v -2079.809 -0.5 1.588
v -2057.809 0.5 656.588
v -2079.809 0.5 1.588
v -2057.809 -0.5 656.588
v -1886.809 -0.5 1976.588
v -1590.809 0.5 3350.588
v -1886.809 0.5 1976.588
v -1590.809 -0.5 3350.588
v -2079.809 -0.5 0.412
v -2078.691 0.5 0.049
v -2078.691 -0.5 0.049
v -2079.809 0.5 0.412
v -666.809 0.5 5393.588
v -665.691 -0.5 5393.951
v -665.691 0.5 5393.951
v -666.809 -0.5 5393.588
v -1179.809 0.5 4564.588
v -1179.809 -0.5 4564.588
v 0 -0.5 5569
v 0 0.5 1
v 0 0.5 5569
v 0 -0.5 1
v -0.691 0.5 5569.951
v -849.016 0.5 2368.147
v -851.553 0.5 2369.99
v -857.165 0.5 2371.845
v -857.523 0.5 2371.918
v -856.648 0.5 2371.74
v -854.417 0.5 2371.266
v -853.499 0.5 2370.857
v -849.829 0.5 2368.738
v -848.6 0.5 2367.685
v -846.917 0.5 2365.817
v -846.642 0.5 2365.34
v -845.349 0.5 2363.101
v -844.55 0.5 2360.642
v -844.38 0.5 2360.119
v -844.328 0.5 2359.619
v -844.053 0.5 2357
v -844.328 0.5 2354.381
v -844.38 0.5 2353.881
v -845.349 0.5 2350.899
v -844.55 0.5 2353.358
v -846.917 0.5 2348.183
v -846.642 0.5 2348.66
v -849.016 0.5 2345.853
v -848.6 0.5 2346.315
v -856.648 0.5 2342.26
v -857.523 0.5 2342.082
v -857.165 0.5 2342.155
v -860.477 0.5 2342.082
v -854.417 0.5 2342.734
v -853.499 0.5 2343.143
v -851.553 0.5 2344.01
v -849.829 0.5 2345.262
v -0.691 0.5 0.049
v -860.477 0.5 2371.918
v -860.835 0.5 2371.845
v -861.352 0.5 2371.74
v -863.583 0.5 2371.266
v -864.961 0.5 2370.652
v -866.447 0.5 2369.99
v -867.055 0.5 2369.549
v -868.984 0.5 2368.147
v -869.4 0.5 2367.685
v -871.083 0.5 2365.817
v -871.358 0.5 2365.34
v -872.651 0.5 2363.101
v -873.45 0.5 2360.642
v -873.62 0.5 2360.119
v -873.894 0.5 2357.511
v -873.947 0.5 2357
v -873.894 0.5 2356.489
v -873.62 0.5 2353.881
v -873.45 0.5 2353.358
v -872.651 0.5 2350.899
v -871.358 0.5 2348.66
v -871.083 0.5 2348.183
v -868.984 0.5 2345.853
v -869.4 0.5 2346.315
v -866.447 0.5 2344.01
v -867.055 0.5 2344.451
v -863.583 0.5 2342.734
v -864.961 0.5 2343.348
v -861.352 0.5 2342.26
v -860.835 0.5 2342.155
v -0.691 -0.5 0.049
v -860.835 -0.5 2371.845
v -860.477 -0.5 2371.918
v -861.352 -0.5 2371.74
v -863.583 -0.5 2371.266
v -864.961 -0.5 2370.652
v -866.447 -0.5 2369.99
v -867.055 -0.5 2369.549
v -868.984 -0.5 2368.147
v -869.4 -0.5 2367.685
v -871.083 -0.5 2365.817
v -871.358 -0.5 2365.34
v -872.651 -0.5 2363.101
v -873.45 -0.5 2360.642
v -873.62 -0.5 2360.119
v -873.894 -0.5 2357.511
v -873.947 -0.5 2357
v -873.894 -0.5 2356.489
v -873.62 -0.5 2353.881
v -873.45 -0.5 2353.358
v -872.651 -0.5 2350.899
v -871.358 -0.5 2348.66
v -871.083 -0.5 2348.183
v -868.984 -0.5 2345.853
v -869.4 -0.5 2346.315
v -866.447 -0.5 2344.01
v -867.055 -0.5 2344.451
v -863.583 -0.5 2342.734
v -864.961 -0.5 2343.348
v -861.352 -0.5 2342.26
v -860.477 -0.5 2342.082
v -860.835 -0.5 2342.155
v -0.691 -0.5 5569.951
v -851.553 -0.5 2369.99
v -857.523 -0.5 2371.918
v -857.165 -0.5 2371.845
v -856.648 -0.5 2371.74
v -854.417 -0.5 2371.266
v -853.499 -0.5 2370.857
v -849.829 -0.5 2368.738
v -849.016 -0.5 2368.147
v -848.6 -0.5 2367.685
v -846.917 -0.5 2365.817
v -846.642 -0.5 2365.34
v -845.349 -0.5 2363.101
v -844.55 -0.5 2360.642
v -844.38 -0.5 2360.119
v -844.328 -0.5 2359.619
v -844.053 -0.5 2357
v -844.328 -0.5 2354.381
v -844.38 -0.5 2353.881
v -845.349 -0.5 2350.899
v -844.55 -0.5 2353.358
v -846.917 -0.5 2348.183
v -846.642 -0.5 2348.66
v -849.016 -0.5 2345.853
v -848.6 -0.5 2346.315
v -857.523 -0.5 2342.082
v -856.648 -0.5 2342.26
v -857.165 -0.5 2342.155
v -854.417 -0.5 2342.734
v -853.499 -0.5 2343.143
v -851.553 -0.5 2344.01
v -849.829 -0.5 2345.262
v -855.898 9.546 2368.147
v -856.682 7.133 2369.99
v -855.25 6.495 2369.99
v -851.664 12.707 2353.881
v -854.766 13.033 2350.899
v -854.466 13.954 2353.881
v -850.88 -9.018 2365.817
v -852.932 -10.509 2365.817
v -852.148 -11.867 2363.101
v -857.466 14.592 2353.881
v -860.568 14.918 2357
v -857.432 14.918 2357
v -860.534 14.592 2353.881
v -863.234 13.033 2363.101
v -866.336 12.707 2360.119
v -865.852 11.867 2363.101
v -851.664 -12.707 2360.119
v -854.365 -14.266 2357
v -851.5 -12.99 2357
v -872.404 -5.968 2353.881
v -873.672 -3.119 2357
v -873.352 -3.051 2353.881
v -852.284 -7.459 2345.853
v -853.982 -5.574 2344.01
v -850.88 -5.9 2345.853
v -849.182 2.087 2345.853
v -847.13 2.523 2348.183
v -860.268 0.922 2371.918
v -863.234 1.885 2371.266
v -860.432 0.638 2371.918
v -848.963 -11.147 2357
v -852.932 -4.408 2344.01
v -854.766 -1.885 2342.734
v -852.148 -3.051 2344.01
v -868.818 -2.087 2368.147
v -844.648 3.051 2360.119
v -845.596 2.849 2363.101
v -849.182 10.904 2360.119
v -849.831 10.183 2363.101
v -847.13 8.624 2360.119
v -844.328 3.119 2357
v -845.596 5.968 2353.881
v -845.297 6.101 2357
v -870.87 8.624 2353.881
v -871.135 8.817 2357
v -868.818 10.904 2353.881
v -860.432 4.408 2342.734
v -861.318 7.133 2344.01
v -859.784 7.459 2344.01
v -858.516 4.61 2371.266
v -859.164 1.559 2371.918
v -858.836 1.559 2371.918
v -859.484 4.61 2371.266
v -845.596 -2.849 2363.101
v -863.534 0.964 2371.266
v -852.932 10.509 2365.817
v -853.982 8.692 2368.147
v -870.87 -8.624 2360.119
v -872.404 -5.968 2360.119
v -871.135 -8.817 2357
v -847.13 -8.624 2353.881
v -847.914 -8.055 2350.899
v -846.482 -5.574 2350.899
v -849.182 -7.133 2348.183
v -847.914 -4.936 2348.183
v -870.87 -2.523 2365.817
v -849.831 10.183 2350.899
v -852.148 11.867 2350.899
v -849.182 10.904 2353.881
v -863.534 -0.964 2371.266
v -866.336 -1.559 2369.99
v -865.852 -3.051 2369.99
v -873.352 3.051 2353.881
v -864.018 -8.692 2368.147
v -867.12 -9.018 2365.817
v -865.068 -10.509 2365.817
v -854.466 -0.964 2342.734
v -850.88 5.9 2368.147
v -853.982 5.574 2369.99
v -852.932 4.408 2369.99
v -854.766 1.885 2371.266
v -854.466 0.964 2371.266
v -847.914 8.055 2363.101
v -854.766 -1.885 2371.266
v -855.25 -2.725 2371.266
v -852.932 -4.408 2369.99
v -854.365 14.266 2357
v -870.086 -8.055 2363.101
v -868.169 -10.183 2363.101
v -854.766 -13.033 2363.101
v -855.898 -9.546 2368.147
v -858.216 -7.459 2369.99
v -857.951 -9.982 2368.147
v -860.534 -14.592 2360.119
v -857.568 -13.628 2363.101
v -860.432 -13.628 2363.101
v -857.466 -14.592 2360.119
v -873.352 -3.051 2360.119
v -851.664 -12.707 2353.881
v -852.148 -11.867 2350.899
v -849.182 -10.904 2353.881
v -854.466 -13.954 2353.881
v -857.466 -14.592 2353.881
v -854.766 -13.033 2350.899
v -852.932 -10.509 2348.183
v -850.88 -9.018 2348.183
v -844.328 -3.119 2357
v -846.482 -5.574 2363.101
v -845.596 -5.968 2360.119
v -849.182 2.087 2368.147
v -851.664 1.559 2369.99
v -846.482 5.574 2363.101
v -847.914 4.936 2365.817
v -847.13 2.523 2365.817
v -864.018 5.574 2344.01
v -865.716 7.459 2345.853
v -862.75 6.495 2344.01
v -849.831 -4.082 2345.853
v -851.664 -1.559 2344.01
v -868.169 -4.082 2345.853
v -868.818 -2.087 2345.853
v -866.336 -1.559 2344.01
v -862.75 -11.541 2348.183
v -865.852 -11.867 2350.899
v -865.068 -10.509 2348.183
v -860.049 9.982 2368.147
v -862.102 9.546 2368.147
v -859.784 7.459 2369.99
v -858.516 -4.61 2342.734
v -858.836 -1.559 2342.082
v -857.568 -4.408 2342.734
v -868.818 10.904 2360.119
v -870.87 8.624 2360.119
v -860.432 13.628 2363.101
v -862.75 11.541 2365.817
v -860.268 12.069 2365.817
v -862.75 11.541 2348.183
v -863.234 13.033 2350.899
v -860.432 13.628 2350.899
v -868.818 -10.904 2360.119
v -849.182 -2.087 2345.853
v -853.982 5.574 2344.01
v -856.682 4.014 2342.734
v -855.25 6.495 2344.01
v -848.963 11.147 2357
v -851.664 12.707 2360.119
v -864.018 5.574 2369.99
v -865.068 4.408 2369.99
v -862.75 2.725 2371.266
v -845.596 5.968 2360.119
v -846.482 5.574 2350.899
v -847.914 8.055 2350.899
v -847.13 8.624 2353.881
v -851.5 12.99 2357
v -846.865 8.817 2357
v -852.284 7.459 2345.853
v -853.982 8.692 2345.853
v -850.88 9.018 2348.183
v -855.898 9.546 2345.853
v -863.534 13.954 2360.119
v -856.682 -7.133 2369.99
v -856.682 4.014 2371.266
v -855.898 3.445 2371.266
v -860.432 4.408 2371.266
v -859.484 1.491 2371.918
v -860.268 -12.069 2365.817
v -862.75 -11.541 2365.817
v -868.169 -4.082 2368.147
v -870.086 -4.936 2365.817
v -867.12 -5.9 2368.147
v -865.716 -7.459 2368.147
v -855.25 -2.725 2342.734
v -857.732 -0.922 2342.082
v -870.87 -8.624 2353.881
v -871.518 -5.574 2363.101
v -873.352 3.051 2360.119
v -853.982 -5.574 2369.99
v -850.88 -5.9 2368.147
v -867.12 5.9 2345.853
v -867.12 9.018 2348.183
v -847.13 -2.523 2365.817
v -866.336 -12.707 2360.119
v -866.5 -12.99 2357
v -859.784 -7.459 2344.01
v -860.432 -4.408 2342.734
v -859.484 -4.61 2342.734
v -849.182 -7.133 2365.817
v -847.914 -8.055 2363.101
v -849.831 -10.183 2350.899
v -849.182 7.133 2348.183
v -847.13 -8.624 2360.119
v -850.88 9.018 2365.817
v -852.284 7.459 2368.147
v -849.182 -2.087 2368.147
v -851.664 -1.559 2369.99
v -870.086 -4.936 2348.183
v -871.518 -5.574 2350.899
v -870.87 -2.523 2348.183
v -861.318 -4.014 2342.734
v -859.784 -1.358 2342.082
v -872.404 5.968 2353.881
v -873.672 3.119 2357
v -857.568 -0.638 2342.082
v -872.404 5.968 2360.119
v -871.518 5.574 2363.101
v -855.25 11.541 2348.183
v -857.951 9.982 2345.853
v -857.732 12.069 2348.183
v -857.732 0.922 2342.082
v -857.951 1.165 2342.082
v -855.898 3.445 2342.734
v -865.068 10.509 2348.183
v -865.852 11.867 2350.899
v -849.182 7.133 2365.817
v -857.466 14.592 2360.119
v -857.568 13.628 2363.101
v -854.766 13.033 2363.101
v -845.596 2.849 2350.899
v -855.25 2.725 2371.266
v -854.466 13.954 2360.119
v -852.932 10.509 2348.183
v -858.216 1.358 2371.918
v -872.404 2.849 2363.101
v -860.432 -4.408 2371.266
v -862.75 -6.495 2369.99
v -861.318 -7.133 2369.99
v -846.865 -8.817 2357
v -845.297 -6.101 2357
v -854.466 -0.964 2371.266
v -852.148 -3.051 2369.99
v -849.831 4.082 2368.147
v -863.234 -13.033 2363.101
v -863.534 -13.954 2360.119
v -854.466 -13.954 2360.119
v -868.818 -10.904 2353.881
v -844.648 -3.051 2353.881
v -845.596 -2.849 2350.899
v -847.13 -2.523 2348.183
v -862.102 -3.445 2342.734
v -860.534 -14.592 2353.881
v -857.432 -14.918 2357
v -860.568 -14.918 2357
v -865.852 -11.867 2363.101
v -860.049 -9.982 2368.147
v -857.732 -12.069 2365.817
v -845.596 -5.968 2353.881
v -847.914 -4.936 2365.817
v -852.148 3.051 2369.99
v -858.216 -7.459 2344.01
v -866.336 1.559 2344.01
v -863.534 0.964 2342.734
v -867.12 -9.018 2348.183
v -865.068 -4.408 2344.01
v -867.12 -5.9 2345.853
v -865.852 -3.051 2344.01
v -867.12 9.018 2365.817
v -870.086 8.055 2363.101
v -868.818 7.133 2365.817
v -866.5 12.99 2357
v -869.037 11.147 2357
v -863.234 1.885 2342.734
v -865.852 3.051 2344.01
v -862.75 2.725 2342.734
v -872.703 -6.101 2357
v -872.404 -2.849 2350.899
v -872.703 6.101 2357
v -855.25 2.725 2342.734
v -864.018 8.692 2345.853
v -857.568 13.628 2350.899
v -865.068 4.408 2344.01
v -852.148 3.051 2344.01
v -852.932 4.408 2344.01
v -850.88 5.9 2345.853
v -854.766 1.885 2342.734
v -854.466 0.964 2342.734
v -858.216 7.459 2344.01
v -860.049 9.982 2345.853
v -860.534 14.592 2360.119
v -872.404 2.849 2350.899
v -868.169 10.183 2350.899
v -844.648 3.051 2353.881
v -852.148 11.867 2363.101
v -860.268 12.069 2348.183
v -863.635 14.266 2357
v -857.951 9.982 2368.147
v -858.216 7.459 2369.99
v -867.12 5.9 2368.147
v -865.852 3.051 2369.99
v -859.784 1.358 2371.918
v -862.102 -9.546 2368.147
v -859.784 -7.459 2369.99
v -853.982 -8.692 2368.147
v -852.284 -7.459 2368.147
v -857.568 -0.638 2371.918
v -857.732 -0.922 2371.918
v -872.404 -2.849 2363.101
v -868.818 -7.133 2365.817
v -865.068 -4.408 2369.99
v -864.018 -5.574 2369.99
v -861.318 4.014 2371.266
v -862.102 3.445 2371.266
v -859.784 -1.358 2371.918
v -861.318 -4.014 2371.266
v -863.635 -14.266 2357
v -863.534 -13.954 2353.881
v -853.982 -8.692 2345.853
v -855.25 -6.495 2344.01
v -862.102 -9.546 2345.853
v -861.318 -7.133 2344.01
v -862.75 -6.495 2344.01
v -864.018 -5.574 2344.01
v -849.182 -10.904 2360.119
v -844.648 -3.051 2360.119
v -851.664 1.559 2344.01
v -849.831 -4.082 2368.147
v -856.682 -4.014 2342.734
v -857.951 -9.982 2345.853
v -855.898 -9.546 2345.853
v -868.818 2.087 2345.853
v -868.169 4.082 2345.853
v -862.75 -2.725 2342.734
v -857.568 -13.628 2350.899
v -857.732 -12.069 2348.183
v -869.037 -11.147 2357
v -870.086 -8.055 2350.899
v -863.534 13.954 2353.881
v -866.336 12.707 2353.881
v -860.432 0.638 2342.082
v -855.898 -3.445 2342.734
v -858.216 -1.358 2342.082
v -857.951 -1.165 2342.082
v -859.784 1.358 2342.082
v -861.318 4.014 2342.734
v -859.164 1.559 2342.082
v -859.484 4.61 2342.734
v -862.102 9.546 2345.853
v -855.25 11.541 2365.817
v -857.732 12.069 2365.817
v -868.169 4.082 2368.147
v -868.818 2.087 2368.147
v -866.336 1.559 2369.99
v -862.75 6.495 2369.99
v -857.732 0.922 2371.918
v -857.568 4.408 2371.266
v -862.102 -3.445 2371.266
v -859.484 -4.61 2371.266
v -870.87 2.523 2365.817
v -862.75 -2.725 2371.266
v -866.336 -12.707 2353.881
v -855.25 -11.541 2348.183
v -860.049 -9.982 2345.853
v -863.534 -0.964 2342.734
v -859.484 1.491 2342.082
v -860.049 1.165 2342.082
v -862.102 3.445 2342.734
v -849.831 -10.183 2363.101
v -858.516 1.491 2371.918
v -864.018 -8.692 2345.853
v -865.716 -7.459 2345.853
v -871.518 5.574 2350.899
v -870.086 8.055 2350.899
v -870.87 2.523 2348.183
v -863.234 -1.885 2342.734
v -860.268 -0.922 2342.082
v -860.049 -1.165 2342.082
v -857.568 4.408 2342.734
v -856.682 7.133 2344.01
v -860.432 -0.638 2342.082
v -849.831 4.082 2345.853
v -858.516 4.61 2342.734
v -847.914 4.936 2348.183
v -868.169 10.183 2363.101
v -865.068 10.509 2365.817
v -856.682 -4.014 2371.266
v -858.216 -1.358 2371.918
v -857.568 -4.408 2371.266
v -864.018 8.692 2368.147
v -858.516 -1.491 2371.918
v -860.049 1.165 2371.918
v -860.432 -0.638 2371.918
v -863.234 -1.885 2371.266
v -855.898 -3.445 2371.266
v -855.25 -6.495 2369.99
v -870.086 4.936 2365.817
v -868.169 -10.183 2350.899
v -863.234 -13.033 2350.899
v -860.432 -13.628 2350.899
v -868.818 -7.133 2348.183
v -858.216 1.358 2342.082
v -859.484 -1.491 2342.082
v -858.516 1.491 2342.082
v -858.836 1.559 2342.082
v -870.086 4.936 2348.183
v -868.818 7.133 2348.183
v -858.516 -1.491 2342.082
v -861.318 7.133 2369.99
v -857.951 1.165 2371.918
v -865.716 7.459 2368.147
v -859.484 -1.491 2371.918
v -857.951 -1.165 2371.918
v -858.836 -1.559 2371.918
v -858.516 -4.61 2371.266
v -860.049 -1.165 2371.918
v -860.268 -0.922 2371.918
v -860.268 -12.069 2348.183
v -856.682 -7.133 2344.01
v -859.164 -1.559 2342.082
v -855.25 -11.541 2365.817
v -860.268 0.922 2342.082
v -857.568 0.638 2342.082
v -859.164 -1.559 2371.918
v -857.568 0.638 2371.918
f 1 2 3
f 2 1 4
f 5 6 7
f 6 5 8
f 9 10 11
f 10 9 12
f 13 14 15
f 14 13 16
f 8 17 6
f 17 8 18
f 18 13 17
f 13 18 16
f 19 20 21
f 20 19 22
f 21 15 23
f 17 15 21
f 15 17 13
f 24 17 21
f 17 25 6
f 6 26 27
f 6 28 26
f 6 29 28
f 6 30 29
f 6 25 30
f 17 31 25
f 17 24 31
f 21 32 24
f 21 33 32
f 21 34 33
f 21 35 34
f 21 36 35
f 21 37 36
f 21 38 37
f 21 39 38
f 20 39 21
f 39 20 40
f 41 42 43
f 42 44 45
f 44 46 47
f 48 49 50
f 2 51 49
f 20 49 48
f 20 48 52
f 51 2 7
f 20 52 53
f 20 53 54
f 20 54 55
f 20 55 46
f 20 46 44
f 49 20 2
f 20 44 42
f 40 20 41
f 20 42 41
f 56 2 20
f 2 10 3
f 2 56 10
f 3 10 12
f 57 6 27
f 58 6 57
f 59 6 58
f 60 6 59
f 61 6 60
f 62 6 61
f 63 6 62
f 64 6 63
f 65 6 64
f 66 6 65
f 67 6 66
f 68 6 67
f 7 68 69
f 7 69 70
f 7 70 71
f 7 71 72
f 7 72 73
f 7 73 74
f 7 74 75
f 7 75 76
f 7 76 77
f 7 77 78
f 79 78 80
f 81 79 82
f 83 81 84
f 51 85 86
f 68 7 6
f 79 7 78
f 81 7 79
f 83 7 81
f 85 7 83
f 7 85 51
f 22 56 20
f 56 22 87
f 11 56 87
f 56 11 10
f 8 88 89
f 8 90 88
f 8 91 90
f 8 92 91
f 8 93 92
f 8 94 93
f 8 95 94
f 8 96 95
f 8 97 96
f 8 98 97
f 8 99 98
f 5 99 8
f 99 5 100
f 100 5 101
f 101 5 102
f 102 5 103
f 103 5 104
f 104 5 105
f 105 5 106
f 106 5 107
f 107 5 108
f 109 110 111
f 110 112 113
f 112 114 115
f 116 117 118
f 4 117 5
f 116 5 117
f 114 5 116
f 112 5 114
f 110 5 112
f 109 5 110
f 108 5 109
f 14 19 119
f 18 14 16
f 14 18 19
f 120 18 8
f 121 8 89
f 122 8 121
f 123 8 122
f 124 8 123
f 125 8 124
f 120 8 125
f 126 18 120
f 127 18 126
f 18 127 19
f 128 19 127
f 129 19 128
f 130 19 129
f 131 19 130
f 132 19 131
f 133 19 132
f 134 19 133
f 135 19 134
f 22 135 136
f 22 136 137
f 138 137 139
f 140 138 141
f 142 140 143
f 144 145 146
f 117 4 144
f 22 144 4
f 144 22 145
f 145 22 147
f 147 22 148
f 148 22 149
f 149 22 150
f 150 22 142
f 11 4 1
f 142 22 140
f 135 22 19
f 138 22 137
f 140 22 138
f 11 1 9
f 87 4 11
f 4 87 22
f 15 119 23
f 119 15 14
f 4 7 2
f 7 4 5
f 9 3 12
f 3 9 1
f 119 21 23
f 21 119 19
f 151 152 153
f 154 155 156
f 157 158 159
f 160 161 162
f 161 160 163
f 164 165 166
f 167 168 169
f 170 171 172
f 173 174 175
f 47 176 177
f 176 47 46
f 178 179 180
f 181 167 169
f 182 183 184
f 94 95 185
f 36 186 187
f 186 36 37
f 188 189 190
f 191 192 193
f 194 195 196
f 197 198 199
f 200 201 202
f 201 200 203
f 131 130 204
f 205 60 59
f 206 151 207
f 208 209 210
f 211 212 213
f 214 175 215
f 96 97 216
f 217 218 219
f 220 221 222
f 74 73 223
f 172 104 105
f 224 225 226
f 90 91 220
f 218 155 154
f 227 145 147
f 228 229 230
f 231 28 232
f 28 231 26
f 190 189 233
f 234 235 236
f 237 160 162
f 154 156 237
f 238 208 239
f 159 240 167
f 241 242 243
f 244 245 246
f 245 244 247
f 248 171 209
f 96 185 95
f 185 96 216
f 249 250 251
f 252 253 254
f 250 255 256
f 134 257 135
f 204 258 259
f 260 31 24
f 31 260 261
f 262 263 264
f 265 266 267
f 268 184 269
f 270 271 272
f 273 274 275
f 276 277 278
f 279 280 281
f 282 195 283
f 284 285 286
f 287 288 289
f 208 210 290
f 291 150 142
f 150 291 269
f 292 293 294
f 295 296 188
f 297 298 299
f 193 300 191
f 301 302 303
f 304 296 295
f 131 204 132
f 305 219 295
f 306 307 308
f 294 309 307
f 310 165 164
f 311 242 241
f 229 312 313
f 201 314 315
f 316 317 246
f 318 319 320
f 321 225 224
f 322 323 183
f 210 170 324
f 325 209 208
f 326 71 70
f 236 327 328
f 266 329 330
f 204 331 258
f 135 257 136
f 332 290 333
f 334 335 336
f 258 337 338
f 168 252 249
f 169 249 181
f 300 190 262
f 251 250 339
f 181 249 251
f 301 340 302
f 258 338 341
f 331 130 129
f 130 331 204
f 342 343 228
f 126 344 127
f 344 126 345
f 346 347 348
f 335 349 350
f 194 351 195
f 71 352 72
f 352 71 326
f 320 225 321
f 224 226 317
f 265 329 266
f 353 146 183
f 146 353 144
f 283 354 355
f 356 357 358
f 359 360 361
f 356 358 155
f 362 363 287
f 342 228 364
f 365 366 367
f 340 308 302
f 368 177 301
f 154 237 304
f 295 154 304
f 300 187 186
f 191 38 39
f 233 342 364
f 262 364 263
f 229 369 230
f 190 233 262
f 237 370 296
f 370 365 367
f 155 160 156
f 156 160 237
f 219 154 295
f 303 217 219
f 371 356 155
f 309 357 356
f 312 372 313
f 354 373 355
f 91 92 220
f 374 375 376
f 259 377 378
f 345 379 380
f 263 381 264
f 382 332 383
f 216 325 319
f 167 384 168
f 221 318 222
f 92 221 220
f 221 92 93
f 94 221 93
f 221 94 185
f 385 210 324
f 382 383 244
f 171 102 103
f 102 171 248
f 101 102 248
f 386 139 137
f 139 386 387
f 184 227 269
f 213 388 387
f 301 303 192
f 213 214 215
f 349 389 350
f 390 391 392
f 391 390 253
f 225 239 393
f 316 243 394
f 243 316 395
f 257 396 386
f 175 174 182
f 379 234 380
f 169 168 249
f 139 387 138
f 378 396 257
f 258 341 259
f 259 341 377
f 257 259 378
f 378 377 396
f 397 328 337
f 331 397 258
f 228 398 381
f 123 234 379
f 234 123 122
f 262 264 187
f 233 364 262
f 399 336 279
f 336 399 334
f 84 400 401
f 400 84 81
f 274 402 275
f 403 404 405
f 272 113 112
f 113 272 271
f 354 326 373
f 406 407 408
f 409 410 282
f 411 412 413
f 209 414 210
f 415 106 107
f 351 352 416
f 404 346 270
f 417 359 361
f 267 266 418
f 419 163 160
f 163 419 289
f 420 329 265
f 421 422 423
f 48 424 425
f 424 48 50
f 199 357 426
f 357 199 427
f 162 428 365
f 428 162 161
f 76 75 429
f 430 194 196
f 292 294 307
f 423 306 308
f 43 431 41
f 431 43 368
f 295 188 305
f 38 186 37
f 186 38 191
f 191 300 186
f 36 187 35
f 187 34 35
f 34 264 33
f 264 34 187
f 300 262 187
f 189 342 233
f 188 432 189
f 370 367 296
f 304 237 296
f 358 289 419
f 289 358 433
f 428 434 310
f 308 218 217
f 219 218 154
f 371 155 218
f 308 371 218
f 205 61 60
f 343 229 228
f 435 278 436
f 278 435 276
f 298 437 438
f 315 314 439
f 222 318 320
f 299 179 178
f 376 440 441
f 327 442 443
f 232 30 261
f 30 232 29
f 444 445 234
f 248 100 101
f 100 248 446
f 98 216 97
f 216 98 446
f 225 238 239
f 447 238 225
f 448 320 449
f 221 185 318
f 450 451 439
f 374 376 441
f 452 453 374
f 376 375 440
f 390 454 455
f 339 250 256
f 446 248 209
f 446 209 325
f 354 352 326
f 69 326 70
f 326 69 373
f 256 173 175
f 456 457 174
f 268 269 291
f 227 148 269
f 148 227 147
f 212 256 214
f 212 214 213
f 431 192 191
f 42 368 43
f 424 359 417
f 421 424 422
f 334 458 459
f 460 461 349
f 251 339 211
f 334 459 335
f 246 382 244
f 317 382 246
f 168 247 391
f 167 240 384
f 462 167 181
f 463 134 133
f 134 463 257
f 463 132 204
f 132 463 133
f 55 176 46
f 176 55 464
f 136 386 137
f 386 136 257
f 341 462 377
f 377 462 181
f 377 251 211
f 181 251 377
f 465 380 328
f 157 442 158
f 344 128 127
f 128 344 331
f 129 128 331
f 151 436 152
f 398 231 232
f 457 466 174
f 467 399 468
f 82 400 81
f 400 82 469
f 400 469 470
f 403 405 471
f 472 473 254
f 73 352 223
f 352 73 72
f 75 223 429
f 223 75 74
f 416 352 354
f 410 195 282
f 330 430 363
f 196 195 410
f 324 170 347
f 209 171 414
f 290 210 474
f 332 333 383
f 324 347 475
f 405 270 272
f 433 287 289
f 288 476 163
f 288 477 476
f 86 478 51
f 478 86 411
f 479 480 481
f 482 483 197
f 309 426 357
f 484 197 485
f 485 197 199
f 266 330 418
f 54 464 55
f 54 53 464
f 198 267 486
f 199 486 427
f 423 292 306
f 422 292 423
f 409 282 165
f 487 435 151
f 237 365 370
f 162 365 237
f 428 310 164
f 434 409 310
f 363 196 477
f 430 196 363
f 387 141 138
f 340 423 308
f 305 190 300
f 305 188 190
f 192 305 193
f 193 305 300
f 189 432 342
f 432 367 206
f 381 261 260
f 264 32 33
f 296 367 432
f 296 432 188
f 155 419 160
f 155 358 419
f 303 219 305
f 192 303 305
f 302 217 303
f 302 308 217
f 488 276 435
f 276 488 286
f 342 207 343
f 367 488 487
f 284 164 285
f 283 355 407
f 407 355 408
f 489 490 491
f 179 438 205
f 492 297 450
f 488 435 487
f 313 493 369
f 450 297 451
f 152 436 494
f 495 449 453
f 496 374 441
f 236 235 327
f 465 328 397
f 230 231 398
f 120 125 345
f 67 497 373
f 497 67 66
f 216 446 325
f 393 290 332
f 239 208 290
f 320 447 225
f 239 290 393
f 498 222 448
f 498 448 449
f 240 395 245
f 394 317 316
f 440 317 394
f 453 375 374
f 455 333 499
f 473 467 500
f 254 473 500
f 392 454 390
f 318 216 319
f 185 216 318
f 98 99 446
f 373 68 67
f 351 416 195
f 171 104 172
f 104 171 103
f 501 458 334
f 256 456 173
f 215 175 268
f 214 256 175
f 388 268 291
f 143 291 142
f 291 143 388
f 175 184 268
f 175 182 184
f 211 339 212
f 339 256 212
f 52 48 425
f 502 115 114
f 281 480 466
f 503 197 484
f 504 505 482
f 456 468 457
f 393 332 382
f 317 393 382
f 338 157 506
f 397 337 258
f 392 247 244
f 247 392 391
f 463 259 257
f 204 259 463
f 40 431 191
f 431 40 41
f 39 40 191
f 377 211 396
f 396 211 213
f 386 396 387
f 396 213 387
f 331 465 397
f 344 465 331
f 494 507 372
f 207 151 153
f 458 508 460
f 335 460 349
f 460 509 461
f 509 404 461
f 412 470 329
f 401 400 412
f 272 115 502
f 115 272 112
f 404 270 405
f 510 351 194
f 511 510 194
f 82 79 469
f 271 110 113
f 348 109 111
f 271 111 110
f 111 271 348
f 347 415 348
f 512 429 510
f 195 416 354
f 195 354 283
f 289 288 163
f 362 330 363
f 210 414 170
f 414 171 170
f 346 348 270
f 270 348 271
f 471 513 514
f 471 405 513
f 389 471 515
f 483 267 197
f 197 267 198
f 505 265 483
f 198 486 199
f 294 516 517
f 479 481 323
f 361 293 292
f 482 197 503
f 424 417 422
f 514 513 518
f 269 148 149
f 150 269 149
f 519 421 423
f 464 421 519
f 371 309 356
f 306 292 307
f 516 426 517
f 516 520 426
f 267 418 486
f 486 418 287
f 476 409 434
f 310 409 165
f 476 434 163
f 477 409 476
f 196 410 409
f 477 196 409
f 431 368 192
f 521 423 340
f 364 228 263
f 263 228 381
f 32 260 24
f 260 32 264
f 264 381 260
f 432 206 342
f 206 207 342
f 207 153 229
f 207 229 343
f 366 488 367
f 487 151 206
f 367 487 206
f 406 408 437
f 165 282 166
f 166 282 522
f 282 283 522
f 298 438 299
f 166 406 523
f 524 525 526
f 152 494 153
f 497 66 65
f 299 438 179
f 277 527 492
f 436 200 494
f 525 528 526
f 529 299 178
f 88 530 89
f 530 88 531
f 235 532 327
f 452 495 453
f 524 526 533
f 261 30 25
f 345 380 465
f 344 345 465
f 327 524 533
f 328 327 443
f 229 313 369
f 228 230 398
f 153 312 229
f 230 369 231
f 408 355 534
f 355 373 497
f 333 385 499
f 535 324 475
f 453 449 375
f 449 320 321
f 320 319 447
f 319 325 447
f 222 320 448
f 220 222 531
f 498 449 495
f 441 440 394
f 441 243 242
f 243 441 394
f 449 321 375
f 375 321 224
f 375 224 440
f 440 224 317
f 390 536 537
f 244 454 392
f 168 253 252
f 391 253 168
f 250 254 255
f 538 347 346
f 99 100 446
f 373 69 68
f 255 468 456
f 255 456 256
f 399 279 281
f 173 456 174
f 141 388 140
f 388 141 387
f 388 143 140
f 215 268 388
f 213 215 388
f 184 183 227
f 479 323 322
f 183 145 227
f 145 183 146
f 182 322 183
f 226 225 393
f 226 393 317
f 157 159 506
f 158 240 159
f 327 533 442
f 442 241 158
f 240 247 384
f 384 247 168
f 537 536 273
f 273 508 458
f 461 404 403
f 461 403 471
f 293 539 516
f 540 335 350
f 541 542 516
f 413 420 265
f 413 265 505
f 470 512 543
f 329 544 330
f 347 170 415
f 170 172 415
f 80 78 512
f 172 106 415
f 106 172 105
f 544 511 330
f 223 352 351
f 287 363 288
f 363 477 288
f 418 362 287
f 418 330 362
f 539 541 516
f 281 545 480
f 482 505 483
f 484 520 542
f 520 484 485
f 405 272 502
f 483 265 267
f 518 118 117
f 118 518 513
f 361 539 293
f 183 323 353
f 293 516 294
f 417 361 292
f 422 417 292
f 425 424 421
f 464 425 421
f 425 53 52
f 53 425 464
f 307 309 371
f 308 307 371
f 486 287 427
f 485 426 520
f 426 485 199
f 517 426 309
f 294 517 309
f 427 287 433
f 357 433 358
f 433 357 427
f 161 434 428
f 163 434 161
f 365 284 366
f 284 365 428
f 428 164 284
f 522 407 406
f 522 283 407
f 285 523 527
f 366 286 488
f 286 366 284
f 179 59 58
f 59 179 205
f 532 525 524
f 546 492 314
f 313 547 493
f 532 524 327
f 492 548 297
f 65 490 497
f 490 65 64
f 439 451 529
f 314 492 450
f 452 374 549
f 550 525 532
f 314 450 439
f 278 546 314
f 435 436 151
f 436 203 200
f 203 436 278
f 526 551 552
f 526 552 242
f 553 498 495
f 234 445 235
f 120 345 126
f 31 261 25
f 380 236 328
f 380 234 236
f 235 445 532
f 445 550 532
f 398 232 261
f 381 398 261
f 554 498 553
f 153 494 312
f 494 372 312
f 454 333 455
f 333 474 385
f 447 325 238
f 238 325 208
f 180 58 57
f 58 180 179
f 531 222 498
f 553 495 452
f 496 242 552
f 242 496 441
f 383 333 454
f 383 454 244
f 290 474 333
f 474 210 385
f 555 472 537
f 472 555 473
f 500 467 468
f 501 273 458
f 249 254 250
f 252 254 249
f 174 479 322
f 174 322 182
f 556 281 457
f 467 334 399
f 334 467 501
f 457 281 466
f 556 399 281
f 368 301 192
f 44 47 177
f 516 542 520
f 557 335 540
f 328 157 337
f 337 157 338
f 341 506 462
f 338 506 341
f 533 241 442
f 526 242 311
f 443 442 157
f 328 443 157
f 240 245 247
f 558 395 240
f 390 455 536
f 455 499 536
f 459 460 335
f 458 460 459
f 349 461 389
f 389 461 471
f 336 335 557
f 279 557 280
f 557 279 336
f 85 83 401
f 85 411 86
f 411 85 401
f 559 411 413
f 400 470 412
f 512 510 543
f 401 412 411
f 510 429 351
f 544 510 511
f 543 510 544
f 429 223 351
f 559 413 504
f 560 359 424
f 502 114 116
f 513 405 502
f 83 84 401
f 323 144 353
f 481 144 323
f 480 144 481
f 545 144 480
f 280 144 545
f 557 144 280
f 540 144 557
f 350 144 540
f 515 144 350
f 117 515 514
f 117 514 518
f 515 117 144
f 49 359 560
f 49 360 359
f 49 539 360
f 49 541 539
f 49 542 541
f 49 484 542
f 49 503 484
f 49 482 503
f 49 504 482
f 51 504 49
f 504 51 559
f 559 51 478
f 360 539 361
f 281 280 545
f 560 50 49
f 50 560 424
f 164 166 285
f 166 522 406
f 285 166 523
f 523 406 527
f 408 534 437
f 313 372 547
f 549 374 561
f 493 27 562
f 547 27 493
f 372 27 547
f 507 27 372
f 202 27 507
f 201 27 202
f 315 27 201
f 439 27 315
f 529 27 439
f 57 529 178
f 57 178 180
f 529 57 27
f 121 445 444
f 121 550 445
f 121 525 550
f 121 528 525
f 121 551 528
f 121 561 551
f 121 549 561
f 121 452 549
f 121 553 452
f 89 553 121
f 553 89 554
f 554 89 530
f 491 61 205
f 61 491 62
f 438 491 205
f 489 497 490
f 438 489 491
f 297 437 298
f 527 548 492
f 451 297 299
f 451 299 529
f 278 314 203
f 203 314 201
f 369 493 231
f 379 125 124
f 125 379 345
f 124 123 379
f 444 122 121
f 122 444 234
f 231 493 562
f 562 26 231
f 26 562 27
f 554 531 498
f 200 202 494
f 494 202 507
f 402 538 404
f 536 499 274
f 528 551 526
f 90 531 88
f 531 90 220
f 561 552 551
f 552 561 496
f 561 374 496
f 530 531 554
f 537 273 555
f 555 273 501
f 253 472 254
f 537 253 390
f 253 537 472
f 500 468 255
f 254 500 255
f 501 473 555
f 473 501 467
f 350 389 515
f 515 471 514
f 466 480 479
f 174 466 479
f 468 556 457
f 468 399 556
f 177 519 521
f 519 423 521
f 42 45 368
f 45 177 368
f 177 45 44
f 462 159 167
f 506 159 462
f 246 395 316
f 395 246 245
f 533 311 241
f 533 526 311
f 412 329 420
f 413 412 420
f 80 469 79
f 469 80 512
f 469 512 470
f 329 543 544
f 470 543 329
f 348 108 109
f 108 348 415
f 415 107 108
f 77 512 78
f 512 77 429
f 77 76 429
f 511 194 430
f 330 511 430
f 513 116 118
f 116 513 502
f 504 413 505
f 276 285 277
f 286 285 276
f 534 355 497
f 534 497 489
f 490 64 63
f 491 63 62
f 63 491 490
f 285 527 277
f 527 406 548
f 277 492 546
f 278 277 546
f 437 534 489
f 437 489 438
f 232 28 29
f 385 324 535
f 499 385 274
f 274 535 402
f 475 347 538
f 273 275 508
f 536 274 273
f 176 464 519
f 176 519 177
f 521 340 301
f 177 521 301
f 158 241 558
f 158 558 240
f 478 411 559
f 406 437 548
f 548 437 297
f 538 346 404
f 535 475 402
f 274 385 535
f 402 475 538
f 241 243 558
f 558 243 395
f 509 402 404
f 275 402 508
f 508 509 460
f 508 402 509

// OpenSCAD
r1 = 1;
wid = 1;


Grot();

module Grot(){

    hull() {
    
        //A0
        translate([ -1 , 0 , 1 ]) 
        rotate([ 90 , 0 , 0 ])
        cylinder( r = r1 , h = wid , center = true );

        //B0
        translate([ - 2079 , 0 , 1 ]) 
        rotate([ 90 , 0 , 0 ])
        cylinder( r = r1 , h = wid , center = true );
    

        //B1
        translate([ - 2057 , 0 , 656 ]) 
        rotate([ 90 , 0 , 0 ])
        cylinder( r = r1 , h = wid , center = true );


        //B2
        translate([ - 1886 , 0 , 1976 ]) 
        rotate([ 90 , 0 , 0 ])
        cylinder( r = r1 , h = wid , center = true );


        //B3
        translate([ - 1590 , 0 , 3350 ]) 
        rotate([ 90 , 0 , 0 ])
        cylinder( r = r1 , h = wid , center = true );


        //B4
        translate([ - 1179 , 0 , 4564 ]) 
        rotate([ 90 , 0 , 0 ])
        cylinder( r = r1 , h = wid , center = true );


        //B6
        translate([ - 666 , 0 , 5393 ]) 
        rotate([ 90 , 0 , 0 ])
        cylinder( r = r1 , h = wid , center = true );

        //B0
        translate([ - 1 , 0 , 5569 ]) 
        rotate([ 90 , 0 , 0 ])
        cylinder( r = r1 , h = wid , center = true );


    }    


    //CP
    translate([ - 859  , 0  , 2357  ])
    sphere(d = 30);

}
